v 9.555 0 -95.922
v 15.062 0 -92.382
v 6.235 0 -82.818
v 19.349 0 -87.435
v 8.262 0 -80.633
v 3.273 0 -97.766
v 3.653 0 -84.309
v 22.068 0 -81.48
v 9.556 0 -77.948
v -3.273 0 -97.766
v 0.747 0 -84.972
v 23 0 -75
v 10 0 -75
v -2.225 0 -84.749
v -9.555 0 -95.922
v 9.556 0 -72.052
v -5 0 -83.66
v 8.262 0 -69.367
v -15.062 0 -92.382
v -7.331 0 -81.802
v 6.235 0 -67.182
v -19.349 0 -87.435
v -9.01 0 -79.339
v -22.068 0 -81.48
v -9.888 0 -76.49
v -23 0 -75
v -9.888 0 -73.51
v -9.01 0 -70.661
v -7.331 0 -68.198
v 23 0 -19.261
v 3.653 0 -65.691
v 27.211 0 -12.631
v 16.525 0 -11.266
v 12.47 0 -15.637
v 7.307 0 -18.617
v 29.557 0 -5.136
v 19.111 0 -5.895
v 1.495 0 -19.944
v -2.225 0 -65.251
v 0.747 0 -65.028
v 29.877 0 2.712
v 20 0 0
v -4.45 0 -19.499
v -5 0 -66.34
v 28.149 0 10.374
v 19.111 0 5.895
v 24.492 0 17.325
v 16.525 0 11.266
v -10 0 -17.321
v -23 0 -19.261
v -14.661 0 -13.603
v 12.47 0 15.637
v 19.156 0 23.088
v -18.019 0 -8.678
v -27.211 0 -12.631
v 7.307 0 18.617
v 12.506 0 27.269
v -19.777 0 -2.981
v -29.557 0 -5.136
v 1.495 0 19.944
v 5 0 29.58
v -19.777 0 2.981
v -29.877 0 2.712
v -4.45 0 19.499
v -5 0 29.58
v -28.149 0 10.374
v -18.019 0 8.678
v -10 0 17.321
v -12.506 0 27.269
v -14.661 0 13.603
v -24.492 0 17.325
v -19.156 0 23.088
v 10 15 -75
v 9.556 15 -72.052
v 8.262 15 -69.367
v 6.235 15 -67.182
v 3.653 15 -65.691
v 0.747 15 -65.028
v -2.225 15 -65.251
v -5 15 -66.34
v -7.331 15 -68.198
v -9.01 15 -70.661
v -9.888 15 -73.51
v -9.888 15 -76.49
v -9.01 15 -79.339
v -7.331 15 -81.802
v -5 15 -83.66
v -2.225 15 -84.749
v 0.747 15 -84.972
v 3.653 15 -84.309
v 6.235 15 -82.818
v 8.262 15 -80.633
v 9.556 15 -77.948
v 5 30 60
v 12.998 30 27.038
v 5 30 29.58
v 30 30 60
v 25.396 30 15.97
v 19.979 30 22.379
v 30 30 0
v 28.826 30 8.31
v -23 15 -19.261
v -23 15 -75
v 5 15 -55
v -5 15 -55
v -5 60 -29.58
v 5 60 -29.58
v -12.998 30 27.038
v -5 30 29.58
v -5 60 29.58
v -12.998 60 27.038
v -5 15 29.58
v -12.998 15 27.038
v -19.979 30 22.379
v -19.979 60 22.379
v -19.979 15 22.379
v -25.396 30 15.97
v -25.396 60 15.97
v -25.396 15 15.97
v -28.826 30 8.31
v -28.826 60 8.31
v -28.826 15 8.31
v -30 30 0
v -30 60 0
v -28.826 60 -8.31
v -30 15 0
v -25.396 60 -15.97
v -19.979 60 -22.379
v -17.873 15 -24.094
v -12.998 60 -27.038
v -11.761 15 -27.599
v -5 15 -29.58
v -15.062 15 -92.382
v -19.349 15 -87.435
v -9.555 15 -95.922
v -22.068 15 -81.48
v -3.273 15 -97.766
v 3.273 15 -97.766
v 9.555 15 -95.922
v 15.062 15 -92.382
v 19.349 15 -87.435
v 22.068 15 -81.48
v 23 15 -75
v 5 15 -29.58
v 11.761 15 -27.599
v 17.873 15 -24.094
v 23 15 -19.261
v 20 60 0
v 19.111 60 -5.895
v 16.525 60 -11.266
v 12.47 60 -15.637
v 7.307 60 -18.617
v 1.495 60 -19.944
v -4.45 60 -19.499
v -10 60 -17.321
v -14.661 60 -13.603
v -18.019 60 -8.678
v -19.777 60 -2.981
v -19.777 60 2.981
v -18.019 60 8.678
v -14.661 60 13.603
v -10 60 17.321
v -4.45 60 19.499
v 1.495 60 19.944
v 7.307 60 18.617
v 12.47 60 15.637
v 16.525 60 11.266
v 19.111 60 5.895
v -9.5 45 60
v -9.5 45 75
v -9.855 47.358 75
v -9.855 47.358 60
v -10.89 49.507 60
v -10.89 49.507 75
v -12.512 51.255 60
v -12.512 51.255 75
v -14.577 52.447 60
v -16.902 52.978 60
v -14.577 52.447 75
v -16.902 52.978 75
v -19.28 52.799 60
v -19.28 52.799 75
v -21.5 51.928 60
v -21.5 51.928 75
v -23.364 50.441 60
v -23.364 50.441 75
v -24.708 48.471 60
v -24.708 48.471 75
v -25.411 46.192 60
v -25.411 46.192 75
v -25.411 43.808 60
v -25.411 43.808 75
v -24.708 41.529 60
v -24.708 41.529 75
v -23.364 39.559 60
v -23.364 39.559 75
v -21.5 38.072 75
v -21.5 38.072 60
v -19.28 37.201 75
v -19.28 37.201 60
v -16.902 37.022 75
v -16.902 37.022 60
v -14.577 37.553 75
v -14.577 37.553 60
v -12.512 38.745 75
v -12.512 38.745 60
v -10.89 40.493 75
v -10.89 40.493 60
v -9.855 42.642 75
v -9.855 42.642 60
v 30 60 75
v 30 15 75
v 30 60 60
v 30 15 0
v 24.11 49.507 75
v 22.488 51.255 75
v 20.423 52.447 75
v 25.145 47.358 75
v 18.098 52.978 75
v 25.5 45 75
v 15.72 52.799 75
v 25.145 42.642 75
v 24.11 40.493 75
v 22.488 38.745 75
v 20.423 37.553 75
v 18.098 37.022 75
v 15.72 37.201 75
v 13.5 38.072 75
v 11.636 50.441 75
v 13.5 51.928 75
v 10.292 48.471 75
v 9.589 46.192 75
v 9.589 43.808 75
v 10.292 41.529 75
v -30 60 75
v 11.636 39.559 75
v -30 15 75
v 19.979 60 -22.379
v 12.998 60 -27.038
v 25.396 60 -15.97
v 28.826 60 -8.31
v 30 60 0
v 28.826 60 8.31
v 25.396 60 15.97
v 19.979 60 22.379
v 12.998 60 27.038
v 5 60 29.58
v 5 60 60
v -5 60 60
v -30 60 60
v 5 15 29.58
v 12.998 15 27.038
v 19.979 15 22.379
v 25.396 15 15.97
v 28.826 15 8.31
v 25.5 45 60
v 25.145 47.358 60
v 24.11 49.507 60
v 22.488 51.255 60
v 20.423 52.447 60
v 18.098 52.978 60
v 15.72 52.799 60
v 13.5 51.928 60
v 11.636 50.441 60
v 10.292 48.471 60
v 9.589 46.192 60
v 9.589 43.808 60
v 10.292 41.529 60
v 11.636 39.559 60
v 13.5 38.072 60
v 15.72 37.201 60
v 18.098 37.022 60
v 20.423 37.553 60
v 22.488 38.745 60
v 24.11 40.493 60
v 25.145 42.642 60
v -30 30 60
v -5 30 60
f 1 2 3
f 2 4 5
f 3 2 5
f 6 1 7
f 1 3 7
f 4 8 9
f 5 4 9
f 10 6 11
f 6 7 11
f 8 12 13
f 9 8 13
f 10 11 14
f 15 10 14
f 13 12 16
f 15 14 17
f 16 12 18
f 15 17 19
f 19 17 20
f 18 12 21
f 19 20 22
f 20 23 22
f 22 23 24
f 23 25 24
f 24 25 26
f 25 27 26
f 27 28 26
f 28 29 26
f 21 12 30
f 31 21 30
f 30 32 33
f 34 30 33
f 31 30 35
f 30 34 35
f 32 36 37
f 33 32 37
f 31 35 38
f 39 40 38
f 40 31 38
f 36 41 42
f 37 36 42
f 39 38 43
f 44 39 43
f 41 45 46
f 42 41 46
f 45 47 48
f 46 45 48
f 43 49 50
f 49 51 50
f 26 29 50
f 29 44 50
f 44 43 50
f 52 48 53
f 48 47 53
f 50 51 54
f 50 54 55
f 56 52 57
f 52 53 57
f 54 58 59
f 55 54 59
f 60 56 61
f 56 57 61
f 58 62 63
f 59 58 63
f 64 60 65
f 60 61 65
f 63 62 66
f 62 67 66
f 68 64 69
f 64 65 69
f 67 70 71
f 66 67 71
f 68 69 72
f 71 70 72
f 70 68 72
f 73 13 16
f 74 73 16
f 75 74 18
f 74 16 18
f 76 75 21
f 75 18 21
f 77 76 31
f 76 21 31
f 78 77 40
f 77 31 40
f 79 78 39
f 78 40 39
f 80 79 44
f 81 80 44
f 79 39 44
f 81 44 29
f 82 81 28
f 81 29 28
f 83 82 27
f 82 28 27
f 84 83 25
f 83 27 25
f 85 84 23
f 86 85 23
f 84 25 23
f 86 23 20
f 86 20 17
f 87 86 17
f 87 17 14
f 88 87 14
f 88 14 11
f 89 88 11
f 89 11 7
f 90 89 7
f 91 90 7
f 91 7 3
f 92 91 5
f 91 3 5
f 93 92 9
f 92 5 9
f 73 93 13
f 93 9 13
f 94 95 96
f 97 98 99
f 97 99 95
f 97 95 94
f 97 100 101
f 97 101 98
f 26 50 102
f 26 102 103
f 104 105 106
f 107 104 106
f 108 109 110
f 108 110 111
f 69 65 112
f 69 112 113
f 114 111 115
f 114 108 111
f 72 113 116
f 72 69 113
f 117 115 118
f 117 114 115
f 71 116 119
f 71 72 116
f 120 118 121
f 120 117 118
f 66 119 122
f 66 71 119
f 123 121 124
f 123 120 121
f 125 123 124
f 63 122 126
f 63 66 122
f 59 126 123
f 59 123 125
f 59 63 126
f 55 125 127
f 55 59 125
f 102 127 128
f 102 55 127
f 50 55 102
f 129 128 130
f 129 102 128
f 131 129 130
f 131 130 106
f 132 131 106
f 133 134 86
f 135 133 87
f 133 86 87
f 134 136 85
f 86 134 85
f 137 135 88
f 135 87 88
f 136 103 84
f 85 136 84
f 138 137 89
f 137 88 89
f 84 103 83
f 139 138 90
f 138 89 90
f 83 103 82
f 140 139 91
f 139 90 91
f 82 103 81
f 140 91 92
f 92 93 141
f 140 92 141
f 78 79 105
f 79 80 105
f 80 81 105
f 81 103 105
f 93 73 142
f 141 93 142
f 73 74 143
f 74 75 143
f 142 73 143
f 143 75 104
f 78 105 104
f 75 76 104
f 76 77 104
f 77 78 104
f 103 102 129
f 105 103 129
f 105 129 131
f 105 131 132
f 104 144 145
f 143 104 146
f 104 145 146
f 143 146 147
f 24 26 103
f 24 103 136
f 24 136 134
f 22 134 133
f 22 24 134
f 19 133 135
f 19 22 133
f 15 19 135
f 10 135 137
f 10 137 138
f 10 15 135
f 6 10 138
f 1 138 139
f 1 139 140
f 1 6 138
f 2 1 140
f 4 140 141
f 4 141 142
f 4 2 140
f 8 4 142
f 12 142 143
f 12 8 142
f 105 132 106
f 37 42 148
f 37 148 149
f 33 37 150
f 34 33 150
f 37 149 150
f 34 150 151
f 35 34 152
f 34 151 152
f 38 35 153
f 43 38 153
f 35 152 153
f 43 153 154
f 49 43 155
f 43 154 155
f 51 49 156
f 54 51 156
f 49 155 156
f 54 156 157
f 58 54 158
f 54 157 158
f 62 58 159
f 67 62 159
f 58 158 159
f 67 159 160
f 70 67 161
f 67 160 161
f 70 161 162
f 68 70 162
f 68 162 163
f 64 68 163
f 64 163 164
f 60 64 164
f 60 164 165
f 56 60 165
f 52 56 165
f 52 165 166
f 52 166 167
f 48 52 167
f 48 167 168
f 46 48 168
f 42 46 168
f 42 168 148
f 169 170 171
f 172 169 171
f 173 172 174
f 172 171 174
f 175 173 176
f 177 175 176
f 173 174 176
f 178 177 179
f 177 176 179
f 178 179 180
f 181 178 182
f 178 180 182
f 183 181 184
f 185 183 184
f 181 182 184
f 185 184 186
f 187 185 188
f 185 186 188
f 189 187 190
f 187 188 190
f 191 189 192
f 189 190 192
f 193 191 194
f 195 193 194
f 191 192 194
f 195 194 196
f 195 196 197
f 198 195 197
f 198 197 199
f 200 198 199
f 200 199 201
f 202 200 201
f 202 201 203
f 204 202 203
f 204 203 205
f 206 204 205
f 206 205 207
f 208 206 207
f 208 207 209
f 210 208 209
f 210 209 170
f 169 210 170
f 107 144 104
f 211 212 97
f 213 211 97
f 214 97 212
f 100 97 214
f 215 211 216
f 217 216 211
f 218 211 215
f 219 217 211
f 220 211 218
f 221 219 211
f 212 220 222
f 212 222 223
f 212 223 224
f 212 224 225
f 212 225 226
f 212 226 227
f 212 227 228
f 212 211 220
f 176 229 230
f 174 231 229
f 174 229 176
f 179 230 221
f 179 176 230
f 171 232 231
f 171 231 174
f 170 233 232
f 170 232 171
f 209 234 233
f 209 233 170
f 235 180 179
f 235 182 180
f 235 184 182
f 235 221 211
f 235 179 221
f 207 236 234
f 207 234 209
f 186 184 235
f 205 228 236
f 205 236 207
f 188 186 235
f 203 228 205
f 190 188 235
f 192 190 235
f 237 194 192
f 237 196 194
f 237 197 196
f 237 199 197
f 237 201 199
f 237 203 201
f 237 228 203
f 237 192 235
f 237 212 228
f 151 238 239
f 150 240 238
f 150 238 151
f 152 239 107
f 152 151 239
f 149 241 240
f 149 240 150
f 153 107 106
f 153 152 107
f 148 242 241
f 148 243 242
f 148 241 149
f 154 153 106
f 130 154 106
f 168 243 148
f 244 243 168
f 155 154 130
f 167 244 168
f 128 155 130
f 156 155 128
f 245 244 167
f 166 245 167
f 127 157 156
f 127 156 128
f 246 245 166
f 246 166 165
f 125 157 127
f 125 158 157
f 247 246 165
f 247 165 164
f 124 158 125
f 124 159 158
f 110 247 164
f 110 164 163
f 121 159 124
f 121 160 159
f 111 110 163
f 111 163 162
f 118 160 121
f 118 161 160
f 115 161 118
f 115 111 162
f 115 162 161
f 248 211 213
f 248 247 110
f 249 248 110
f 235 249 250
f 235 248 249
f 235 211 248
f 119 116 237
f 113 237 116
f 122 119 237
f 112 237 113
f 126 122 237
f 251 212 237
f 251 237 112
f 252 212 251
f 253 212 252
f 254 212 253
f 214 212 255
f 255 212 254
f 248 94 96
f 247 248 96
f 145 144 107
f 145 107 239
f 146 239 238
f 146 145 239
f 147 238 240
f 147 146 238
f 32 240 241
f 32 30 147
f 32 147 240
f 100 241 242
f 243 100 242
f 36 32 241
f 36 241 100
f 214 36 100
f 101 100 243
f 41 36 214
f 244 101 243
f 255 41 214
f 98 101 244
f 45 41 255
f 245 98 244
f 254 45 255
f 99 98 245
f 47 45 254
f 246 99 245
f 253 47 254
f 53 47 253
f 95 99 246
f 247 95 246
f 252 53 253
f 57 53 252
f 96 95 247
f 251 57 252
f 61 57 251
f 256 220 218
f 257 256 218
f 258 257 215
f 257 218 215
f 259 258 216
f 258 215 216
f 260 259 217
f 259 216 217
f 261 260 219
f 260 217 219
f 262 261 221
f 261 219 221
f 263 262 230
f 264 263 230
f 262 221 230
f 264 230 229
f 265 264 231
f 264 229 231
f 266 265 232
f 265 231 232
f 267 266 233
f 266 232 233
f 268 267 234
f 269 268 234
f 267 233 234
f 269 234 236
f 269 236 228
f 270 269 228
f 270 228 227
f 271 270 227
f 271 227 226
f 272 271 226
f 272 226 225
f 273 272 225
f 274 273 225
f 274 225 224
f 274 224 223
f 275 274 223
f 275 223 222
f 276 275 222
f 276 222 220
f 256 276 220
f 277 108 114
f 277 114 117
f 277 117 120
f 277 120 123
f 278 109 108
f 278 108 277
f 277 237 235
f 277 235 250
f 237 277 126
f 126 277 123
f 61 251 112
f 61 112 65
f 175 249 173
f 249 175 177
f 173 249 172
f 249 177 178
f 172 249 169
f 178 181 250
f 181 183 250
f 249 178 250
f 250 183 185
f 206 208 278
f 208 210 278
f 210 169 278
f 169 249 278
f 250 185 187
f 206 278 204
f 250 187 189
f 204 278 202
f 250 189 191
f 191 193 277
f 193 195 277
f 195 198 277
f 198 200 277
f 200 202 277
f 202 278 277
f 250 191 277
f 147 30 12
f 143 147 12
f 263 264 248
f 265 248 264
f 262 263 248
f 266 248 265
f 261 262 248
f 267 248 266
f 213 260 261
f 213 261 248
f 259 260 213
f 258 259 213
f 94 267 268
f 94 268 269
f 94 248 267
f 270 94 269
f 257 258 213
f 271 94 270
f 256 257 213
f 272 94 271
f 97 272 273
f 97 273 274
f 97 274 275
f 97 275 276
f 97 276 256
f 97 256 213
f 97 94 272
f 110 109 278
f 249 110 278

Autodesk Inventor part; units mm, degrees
ref_plane "YZ Plane" through (0, 0, 0) normal (1, 0, 0) x (0, 1, 0)
ref_plane "XZ Plane" through (0, 0, 0) normal (0, 1, 0) x (-1, 0, 0)
ref_plane "XY Plane" through (0, 0, 0) normal (0, 0, 1) x (1, 0, 0)
sketch "Boceto1" plane through (0, 0, 0) normal (0, 1, 0) x (-1, 0, 0)
  circle A0 centre (0, 0) radius 20
  circle A1 centre (0, 0) radius 30
  line L0 (0, 0) -> (0, 60)
  line L1 (0, 60) -> (5, 60)
  line L2 (5, 60) -> (-5, 60)
  line L3 (-5, 60) -> (-5, 0)
  line L4 (-5, 0) -> (5, 0)
  line L5 (5, 0) -> (5, 60)
  line L6 (0, 60) -> (30, 60)
  line L7 (30, 60) -> (-30, 60)
  line L8 (-30, 60) -> (-30, 75)
  line L9 (-30, 75) -> (30, 75)
  line L10 (30, 75) -> (30, 60)
  point P0 (-5, 29.5804)
  point P1 (5, 29.5804)
  dimension "d0" = 40
  dimension "d1" = 60
  dimension "d2" = 60
  dimension "d3" = 5
  dimension "d4" = 10
  dimension "d5" = 30
  dimension "d6" = 60
  dimension "d7" = 15
extrude "Extrusión1" add sketch "Boceto1" along normal blind 60
sketch "Boceto2" plane through (30, 0, 75) normal (1, 0, 0) x (0, 0, -1)
  line L0 (0, 60) -> (15, 60) projected
  line L1 (0, 60) -> (0, 15)
  line L2 (0, 0) -> (0, 60) projected
  line L3 (0, 15) -> (75, 15)
  line L4 (75, 15) -> (75, 30)
  line L5 (75, 30) -> (15, 30)
  line L6 (15, 0) -> (15, 60) projected
  point P0 (75, 0)
  point P1 (15, 15)
  dimension "d10" = 45
  dimension "d11" = 15
extrude "Extrusión2" add sketch "Boceto2" against normal blind 60 contours L5 L4 L3 L6
sketch "Boceto3" plane through (30, 0, 75) normal (1, 0, 0) x (0, 0, -1)
  line L0 (45.4196, 15) -> (15, 15) projected
  line L1 (15, 15) -> (0, 15)
  line L2 (0, 0) -> (0, 60) projected
  line L3 (45.4196, 0) -> (15, 0) projected
  line L4 (0, 15) -> (45.4196, 15)
  line L5 (45.4196, 15) -> (45.4196, 0)
  line L6 (45.4196, 0) -> (0, 0)
  line L7 (0, 0) -> (0, 15)
  point P0 (75, 0)
extrude "Extrusión3" cut sketch "Boceto3" against normal blind 60
sketch "Boceto4" plane through (-30, 60, 75) normal (0, 0, 1) x (1, 0, 0)
  line L0 (60, 0) -> (0, 0) projected
  line L1 (30, 0) -> (47.5, 0)
  line L2 (47.5, 0) -> (47.5, -15)
  line L3 (30, 0) -> (30, -5.3607)
  circle A0 centre (47.5, -15) radius 8
  circle A1 centre (12.5, -15) radius 8
  point P0 (30, -60)
  point P1 (35, 0)
  point P2 (25, 0)
  dimension "d16" = 17.5
  dimension "d17" = 15
  dimension "d18" = 16
extrude "Extrusión4" cut sketch "Boceto4" against normal blind 15
sketch "Boceto5" plane through (0, 60, 0) normal (0, 1, 0) x (1, 0, 0)
  circle A0 centre (0, 0) radius 20
  dimension "d21" = 40
extrude "Extrusión5" cut sketch "Boceto5" against normal blind 60
sketch "Boceto6" plane through (0, 0, 0) normal (0, -1, 0) x (1, 0, 0)
  line L0 (0, 0) -> (0, -75)
  circle A0 centre (0, -75) radius 10
  circle A1 centre (0, -75) radius 23
  line L1 (0, -75) -> (23, -75)
  arc A2 (-5, 29.5804) -> (5, 29.5804) centre (0, 0) ccw projected
  line L2 (23, -19.2614) -> (23, -75)
  line L3 (-23, -19.2614) -> (-23, -75)
  dimension "d24" = 75
  dimension "d25" = 20
  dimension "d26" = 46
extrude "Extrusión6" add sketch "Boceto6" against normal blind 15 contours A2 L2 A1 L0 | L0 A1 L3 A2 | A1 L1 A0 L0 | L0 A0 L1 A1
sketch "Boceto7" plane through (0, 60, 0) normal (0, 1, 0) x (1, 0, 0)
  arc A0 (5, -29.5804) -> (-5, -29.5804) centre (0, 0) ccw projected
  line L0 (0, 30) -> (0, 55)
  line L1 (0, 55) -> (5, 55)
  line L2 (5, 29.5804) -> (5, 55)
  line L3 (0, 55) -> (-5, 55)
  line L4 (-5, 29.5804) -> (-5, 55)
  arc A1 (5, 29.5804) -> (-5, 29.5804) centre (0, 0) ccw
  dimension "d29" = 25
  dimension "d30" = 5
extrude "Extrusión7" add sketch "Boceto7" against normal blind 45
sketch "Boceto8" plane through (-5, 60, -55) normal (-1, 0, 0) x (0, 0, 1)
  line L0 (0, 0) -> (0, -45) projected
  line L1 (84.5804, 0) -> (25.4196, 0) projected
  line L2 (0, -45) -> (25.4196, 0)
  line L3 (35.7386, -45) -> (25.4196, -45) projected
  line L4 (25.4196, 0) -> (25.4196, -45)
  line L5 (25.4196, -45) -> (0, -45)
  line L6 (0, -45) -> (0, 0)
  line L7 (25.4196, 0) -> (0, 0)
  point P0 (55, -60)
extrude "Extrusión8" cut sketch "Boceto8" against normal blind 45 contours L7 L2 L0
